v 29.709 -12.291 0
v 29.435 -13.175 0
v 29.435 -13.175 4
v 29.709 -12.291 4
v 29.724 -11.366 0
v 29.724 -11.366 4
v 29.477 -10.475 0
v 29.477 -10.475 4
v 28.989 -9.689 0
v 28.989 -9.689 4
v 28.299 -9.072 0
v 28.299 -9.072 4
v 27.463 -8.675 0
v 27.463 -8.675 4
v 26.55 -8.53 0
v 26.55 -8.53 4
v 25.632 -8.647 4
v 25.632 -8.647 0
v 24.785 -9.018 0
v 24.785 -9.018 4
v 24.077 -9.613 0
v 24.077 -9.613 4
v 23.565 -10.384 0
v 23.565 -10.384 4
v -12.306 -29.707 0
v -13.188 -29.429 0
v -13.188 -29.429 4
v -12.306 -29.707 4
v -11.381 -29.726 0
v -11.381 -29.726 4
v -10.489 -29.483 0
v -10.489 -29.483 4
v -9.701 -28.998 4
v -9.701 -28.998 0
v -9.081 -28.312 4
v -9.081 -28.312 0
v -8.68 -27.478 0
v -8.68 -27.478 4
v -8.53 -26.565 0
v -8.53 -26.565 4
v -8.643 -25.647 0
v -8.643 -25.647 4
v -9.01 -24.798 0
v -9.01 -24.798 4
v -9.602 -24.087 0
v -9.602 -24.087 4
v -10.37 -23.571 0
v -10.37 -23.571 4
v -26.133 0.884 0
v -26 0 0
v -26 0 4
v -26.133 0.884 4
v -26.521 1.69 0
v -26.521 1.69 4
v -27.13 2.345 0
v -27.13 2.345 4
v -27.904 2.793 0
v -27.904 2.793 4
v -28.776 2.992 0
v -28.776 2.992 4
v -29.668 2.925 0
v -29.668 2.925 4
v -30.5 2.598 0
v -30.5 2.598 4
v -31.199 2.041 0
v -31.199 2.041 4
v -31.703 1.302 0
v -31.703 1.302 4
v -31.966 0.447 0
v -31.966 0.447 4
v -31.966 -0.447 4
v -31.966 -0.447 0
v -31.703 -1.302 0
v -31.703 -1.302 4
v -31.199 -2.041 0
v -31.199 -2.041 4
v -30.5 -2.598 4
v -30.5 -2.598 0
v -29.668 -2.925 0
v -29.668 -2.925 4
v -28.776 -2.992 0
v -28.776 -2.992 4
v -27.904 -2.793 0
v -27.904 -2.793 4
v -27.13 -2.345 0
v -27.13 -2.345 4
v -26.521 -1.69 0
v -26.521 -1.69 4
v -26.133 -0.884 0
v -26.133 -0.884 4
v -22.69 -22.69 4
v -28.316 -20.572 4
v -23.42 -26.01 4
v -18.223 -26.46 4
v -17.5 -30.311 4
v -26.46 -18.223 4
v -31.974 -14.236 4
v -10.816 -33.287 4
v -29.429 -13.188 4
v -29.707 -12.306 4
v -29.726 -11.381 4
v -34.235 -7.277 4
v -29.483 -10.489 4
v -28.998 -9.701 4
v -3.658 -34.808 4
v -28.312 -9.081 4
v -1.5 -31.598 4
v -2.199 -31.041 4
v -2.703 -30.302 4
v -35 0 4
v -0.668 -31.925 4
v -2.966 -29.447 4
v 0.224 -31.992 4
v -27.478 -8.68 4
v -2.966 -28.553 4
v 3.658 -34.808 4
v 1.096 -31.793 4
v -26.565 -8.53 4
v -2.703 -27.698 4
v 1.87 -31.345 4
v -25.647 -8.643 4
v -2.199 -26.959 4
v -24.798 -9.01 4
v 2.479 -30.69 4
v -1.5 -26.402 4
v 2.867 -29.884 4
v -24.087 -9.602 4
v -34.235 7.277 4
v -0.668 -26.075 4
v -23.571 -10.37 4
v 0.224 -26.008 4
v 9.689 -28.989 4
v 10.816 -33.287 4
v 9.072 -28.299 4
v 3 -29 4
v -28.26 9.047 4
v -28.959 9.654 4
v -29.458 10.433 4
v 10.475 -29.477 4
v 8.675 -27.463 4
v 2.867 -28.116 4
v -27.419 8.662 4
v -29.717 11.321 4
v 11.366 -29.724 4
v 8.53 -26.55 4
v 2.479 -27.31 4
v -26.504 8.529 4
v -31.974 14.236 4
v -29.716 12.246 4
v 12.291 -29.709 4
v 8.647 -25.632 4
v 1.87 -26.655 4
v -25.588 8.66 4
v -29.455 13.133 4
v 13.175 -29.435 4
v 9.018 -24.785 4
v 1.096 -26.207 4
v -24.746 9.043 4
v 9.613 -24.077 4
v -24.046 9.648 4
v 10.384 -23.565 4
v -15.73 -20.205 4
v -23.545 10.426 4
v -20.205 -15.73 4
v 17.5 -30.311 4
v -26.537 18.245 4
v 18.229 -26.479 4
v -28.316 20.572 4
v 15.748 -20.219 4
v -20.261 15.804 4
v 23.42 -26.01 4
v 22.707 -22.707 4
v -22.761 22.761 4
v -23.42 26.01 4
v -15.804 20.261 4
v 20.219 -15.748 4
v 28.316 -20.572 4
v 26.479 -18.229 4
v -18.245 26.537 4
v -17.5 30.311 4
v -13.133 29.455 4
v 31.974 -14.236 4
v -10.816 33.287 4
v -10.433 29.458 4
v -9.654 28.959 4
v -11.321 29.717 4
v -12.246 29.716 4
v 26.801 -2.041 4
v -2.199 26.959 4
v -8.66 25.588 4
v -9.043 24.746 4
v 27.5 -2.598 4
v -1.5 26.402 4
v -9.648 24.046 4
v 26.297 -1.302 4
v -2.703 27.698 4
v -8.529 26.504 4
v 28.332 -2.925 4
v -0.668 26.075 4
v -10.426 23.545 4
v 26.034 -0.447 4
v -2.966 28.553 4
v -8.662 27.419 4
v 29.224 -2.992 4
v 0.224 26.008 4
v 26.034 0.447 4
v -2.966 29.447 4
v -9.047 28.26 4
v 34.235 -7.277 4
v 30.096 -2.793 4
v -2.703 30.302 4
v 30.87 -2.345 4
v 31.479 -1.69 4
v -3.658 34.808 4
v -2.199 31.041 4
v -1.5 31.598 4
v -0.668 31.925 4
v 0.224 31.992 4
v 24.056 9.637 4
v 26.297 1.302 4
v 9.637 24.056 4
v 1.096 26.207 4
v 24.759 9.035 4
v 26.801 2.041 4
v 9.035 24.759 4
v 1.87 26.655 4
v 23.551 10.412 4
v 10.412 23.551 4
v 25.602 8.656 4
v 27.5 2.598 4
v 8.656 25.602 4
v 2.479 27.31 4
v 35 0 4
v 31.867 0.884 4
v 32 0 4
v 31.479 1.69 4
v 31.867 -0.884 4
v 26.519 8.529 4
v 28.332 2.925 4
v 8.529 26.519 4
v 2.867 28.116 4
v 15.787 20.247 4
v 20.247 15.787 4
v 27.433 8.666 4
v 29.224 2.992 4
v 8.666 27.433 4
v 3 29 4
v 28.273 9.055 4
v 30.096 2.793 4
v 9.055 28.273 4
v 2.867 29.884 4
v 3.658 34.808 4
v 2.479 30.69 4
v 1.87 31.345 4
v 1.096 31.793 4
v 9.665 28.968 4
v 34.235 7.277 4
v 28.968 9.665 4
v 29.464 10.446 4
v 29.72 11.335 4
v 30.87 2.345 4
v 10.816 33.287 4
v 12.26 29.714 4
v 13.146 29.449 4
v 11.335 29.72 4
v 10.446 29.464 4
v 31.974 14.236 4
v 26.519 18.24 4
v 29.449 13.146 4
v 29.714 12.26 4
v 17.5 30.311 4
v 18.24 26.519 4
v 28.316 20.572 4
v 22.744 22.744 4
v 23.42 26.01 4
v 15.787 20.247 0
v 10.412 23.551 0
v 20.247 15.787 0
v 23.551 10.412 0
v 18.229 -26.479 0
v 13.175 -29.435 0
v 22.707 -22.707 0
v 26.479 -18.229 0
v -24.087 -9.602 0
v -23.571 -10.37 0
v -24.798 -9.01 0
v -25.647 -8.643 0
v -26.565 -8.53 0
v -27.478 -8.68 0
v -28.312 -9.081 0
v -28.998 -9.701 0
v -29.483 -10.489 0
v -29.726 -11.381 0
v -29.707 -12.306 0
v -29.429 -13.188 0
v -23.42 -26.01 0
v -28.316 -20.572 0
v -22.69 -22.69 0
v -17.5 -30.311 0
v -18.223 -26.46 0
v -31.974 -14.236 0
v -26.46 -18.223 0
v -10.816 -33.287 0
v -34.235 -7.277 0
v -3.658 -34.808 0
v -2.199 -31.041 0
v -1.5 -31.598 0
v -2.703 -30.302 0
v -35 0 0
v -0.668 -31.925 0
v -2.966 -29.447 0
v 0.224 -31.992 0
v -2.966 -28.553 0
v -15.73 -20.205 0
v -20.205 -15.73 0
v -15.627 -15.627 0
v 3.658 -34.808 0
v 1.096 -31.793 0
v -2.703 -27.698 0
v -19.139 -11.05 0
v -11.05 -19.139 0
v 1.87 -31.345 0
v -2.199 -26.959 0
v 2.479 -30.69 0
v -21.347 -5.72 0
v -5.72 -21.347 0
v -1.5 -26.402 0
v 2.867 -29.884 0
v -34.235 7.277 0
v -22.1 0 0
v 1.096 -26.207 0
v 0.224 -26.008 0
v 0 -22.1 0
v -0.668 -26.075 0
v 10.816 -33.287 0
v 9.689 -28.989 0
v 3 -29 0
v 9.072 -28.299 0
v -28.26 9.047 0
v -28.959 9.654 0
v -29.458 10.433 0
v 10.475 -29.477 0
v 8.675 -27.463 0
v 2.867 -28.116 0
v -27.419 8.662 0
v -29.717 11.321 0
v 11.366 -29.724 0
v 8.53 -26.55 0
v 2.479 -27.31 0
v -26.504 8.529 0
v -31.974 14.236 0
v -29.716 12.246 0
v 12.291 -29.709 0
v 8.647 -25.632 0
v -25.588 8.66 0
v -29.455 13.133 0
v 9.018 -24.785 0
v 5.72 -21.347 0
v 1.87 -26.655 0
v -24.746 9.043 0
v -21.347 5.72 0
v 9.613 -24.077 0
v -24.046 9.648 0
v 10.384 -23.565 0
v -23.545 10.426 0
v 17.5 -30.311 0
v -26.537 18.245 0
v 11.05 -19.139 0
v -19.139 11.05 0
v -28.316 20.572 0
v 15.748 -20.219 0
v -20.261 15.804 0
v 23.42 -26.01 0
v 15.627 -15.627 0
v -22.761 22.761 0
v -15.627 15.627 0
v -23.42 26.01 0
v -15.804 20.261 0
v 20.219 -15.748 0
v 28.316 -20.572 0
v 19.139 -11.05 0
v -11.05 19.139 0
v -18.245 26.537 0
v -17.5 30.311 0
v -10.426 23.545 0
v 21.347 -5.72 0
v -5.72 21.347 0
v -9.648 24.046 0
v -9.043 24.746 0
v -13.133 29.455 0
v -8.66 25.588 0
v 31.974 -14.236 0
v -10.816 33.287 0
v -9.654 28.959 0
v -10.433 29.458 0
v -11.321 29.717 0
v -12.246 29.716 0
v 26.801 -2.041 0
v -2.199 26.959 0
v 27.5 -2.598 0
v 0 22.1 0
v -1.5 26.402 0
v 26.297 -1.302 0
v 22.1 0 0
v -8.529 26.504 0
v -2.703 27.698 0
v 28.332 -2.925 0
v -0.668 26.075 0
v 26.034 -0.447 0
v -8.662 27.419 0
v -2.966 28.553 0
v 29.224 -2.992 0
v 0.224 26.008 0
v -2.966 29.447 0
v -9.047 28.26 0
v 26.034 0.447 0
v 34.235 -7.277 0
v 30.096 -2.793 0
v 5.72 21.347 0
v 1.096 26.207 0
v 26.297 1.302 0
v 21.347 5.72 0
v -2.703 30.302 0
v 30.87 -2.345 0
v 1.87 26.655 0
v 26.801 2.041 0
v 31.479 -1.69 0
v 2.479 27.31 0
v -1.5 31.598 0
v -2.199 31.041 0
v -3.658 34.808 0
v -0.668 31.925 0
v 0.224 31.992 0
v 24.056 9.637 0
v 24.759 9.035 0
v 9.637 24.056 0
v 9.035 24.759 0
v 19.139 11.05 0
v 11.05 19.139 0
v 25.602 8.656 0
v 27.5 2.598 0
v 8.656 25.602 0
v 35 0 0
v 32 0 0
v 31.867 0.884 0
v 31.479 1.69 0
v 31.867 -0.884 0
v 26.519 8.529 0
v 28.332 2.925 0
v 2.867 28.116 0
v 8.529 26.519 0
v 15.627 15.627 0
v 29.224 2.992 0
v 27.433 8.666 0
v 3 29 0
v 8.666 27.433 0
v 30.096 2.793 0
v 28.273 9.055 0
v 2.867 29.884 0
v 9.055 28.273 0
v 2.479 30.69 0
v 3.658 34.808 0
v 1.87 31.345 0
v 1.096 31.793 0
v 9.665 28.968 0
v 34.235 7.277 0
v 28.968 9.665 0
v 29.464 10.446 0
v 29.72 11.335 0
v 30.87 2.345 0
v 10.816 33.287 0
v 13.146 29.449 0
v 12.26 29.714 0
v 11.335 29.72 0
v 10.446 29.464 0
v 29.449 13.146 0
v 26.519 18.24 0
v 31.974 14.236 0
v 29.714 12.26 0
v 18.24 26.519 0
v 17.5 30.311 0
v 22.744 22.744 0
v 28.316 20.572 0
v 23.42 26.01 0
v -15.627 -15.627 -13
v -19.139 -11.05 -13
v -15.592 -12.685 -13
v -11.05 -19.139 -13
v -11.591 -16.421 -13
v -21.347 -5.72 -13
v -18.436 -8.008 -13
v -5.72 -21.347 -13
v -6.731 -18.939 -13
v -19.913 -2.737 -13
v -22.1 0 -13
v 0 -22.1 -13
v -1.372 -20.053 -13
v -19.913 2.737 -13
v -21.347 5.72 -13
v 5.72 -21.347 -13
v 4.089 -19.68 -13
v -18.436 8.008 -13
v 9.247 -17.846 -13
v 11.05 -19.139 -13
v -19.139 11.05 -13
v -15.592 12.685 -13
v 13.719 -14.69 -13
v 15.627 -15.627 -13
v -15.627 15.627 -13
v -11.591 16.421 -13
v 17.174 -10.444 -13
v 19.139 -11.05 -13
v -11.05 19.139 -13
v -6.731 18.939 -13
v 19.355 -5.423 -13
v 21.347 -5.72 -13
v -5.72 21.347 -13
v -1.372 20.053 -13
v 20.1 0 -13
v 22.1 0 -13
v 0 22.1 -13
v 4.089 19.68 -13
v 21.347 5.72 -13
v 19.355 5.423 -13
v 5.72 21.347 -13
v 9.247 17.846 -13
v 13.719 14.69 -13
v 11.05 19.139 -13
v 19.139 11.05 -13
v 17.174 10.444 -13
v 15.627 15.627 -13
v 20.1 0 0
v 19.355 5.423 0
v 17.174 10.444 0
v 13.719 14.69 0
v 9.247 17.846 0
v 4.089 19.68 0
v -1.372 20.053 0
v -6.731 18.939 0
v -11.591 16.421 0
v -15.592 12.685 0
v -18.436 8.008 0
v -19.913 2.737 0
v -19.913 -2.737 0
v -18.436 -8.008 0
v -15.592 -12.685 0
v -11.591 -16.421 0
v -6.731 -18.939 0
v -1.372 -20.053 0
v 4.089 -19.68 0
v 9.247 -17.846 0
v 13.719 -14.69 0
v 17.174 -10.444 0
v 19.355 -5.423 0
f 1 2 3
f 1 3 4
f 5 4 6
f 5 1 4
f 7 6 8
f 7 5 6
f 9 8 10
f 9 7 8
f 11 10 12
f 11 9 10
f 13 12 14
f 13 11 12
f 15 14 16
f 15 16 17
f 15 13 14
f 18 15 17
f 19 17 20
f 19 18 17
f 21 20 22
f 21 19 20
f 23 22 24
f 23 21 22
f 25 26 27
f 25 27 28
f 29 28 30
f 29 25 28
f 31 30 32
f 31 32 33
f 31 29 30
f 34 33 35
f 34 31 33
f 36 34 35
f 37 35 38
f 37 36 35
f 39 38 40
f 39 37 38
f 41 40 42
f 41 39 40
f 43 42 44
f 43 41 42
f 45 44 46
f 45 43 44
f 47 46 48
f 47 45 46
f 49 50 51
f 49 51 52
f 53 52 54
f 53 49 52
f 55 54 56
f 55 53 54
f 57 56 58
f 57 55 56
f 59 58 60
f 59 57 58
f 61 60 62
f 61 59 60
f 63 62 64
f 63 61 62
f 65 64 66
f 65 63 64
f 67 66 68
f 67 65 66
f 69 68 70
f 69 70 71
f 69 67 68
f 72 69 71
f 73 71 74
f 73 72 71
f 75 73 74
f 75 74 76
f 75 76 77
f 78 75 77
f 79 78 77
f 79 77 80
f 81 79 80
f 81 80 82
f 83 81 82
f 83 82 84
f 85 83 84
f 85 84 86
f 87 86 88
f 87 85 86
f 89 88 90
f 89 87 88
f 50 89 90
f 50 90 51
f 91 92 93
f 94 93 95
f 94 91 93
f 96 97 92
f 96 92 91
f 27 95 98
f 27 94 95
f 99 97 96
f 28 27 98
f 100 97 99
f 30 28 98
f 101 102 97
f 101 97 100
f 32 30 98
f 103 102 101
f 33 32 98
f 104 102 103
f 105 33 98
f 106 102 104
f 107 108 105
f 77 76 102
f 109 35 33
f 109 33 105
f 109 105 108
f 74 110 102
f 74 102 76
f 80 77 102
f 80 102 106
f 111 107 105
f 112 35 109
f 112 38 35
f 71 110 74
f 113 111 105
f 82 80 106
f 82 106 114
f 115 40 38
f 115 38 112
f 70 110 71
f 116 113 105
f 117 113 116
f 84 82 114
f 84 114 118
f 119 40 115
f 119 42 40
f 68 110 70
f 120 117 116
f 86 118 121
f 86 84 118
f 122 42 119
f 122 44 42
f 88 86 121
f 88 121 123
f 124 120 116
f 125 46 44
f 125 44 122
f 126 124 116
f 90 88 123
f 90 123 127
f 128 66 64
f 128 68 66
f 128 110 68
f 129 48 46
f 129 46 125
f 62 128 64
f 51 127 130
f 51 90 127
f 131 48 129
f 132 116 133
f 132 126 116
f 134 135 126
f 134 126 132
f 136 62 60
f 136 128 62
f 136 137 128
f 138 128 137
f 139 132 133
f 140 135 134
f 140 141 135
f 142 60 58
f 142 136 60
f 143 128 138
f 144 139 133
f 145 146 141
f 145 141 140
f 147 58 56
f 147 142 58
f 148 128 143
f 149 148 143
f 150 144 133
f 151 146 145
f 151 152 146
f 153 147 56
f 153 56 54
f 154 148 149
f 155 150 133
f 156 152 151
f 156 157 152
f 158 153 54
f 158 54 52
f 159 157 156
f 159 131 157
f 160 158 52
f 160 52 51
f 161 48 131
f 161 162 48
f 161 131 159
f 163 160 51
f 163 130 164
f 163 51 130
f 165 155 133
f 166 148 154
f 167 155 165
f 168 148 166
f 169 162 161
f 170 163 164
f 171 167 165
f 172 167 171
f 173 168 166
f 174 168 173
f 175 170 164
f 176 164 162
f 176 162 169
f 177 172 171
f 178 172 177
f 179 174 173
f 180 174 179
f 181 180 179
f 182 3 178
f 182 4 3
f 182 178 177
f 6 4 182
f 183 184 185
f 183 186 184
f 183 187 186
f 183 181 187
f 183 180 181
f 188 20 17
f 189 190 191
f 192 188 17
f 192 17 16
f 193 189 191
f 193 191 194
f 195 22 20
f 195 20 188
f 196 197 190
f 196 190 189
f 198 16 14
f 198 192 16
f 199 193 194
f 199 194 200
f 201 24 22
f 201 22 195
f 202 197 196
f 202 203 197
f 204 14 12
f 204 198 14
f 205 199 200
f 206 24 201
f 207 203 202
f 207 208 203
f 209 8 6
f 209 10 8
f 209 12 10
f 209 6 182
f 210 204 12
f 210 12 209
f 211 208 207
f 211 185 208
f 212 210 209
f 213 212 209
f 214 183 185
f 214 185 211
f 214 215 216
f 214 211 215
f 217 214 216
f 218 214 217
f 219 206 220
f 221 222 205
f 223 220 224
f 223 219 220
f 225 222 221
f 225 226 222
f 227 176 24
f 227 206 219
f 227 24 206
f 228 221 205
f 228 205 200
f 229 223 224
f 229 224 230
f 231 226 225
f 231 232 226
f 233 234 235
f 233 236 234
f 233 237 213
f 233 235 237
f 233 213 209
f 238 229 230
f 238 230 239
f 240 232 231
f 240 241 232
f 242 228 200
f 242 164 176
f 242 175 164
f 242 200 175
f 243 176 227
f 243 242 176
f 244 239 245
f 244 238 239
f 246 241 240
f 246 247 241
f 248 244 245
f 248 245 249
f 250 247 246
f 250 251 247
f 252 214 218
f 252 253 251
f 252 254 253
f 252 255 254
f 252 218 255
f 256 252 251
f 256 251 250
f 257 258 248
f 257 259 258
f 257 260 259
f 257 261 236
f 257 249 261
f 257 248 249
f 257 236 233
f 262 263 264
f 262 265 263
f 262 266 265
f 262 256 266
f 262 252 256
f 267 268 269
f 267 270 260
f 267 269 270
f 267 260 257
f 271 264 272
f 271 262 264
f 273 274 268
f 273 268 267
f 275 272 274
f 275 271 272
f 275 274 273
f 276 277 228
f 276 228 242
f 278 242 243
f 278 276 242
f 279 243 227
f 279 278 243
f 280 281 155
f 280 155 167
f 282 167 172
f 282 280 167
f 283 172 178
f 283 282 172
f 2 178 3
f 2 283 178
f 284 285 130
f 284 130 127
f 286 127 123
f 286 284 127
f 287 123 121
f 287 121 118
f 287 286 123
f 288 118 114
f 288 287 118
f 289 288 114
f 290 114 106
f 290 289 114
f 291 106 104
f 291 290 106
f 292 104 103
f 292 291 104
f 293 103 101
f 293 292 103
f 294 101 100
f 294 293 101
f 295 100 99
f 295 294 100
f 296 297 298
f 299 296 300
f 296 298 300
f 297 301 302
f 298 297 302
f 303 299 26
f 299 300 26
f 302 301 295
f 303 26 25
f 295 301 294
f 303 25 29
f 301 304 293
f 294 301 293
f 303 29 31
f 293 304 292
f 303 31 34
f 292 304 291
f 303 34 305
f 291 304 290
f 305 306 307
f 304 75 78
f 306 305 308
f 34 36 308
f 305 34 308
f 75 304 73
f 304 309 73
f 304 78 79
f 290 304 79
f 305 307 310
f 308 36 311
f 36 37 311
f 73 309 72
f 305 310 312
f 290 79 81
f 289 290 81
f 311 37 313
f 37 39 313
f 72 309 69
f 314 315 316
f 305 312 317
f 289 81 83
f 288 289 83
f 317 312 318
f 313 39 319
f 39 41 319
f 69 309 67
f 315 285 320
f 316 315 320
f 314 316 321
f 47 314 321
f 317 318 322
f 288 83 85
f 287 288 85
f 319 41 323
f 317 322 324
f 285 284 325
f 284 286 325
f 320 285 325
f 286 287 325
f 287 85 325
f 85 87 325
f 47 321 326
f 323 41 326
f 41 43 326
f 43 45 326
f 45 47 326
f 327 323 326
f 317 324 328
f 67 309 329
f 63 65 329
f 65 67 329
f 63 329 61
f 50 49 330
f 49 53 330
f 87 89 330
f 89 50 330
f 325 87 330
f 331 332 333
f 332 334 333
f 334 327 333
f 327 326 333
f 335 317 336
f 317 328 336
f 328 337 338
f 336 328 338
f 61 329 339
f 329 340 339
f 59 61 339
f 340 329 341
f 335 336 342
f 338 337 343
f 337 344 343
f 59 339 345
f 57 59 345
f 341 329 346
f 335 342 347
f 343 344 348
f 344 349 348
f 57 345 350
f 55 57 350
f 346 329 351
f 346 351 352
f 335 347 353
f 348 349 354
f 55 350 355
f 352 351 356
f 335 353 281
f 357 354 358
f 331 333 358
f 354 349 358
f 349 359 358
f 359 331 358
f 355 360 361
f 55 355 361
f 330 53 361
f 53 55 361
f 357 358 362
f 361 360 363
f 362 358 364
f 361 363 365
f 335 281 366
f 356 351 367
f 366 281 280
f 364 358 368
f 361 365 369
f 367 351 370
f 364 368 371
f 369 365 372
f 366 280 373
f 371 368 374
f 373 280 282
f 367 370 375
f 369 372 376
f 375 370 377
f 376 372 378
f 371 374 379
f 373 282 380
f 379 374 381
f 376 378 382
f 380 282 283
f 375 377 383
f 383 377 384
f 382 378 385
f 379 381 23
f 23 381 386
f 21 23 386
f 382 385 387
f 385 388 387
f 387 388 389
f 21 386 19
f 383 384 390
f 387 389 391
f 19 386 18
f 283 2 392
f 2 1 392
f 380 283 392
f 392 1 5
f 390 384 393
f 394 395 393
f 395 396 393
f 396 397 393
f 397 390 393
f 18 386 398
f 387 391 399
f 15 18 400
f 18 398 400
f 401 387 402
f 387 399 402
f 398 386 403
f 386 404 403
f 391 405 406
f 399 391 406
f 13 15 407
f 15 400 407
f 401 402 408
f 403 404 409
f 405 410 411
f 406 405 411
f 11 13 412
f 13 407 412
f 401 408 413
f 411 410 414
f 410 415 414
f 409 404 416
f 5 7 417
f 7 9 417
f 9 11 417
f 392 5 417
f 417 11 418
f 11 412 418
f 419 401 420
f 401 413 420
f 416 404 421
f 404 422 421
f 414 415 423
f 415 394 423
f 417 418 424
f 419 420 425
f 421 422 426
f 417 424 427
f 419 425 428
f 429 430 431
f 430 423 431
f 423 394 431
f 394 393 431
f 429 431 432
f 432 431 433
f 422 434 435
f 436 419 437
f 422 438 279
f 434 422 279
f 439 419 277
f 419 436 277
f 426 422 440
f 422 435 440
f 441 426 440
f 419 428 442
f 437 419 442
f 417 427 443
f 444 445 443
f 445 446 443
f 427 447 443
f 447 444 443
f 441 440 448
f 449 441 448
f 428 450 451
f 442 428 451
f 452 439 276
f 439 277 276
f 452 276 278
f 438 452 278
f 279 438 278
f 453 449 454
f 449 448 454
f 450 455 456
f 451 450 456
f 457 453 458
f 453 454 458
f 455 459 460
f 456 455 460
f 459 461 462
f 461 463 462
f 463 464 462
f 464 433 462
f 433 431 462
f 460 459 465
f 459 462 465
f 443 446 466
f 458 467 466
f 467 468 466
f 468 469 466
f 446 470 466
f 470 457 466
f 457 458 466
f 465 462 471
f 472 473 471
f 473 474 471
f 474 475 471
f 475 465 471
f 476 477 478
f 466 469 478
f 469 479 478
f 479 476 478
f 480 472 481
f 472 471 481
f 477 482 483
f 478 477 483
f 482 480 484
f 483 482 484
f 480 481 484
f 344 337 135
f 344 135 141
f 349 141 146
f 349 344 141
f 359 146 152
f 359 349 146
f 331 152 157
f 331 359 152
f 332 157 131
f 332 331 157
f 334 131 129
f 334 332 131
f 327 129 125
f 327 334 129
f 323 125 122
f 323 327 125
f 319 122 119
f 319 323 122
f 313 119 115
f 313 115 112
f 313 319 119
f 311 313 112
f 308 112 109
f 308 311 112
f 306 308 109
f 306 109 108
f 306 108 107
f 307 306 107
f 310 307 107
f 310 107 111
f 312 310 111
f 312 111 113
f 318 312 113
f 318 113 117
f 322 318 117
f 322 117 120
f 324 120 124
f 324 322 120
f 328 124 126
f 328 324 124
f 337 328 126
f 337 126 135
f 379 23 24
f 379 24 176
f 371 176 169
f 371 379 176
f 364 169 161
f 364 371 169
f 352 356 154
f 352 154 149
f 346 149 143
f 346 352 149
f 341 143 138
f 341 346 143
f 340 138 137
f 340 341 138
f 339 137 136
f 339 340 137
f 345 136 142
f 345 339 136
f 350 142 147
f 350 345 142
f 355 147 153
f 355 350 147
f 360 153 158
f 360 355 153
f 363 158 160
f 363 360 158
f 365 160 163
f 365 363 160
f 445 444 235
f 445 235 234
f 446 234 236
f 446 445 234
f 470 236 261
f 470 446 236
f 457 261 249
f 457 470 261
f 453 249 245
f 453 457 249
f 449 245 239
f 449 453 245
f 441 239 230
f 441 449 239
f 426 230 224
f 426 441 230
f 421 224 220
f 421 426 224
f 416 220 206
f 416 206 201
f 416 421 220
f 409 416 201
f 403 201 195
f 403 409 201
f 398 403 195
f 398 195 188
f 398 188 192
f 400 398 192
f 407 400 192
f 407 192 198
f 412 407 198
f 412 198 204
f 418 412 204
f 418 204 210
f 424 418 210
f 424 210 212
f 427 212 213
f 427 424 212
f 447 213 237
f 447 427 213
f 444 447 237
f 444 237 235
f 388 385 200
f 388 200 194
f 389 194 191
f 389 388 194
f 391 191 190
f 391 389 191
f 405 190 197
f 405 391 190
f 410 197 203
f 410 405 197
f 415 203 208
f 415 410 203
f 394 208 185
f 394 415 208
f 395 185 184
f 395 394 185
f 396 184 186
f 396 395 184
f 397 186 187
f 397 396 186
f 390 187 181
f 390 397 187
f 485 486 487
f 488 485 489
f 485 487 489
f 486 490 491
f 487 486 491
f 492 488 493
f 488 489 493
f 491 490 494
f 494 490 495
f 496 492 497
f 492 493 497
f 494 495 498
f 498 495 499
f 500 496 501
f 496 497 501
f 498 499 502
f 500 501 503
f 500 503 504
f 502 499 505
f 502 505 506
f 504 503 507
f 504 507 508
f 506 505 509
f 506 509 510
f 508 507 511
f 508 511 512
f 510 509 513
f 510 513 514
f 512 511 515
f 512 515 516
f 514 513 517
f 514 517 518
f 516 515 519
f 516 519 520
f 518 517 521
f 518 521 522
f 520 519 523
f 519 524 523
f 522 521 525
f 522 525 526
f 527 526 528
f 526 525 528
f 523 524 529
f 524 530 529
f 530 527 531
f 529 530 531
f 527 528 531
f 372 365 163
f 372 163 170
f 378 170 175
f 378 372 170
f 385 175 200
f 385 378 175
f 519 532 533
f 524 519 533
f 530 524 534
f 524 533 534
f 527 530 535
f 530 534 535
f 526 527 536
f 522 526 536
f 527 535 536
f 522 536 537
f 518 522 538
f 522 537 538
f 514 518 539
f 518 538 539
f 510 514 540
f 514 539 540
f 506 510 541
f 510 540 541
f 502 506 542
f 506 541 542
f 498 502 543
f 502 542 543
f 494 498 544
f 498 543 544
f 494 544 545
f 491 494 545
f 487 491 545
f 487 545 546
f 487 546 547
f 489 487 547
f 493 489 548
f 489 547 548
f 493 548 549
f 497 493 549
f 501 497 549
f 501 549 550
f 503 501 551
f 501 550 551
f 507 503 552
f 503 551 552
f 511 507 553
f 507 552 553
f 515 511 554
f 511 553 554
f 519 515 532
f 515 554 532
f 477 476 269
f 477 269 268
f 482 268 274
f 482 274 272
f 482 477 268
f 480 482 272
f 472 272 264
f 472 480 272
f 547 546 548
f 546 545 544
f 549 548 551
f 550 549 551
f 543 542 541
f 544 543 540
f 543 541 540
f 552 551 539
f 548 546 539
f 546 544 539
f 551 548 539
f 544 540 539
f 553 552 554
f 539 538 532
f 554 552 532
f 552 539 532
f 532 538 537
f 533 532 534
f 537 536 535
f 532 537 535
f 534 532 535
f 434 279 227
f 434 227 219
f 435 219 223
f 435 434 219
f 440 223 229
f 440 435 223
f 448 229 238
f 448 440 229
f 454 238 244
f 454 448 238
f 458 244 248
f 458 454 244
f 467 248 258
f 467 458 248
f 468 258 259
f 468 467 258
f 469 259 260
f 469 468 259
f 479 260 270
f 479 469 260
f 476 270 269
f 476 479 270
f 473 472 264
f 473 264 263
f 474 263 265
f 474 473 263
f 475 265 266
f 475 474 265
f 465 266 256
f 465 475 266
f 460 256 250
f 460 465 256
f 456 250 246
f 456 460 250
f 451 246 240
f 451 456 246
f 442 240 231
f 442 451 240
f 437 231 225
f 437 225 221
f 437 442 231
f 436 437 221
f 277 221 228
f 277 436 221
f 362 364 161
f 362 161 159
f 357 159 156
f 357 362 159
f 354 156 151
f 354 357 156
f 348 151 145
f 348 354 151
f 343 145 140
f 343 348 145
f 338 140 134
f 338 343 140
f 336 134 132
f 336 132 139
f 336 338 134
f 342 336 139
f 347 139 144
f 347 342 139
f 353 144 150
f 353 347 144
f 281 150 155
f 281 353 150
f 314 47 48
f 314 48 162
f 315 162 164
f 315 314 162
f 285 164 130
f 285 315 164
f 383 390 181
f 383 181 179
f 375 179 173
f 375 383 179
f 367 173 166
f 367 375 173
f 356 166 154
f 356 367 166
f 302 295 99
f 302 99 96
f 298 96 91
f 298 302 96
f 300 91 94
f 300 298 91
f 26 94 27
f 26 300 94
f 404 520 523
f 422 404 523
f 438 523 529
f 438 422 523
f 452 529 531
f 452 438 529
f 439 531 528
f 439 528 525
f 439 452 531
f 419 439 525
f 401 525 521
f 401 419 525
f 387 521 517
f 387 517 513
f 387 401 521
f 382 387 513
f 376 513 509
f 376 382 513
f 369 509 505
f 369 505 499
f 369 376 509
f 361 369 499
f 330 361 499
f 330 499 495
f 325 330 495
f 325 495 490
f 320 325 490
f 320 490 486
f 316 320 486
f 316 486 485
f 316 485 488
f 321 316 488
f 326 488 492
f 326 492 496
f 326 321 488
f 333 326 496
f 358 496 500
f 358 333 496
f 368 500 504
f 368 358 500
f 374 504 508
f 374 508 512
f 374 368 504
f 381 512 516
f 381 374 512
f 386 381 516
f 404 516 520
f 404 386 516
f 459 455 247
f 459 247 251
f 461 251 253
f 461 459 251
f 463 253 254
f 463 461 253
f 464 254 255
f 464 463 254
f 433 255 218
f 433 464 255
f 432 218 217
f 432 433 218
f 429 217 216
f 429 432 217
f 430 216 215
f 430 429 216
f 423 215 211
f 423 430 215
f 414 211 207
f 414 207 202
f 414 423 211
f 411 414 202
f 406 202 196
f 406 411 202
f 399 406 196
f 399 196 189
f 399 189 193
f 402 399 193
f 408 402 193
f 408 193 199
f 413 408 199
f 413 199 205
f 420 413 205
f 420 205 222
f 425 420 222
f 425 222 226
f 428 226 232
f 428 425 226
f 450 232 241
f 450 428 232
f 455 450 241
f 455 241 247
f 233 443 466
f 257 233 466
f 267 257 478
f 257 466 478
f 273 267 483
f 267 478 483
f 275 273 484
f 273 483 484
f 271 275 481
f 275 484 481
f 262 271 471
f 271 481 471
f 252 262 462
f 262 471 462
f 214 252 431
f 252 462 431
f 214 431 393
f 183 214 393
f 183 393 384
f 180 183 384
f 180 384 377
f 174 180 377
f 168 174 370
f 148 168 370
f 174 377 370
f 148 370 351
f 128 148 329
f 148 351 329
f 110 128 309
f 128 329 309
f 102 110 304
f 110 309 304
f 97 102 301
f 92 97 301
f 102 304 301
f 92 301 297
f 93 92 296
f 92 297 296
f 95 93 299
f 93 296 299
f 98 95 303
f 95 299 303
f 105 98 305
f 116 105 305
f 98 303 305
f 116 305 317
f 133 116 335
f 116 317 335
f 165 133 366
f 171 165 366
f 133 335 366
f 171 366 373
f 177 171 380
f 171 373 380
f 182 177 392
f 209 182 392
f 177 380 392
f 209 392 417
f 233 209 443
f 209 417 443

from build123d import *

# Parameters (mm, degrees)
SKETCH_1_R          = 22.1
SKETCH_1_R_2        = 20.1
EXTRUDE_1_DEPTH     = 13
SKETCH_3_R          = 35
EXTRUDE_2_DEPTH     = 4
CUT_EXTRUDE_2_DEPTH = 4
SKETCH_7_R          = 2.5
CUT_EXTRUDE_3_DEPTH = 4
SKETCH_8_R          = 3
CUT_EXTRUDE_4_DEPTH = 4


with BuildPart() as part:
    # 草图1 → 凸台-拉伸1 (new body)
    with BuildSketch(Plane.XY):
        Circle(SKETCH_1_R)
        Circle(SKETCH_1_R_2, mode=Mode.SUBTRACT)
    extrude(amount=-EXTRUDE_1_DEPTH)

    # 草图3 → 凸台-拉伸2 (add)
    with BuildSketch(Plane.XY):
        Circle(SKETCH_3_R)
    extrude(amount=EXTRUDE_2_DEPTH)

    # 草图6 → 切除-拉伸2 (cut)
    with BuildSketch(Plane.XY):
        with BuildLine():
            ThreePointArc((-13.13288474, 29.454672407), (-22.761081404, 22.761081404), (-29.454672407, 13.13288474))
            ThreePointArc((-29.454672407, 13.13288474), (-27.853665751, 8.824546582), (-23.545327593, 10.425553238))
            ThreePointArc((-23.545327593, 10.425553238), (-18.164887326, 18.164887326), (-10.425553238, 23.545327593))
            ThreePointArc((-10.425553238, 23.545327593), (-8.824546582, 27.853665751), (-13.13288474, 29.454672407))
        make_face()
        with BuildLine():
            ThreePointArc((29.448536872, 13.146197524), (22.743952769, 22.743952769), (13.146197524, 29.448536872))
            ThreePointArc((13.146197524, 29.448536872), (8.830682117, 27.866978535), (10.412240454, 23.551463128))
            ThreePointArc((10.412240454, 23.551463128), (18.147758691, 18.147758691), (23.551463128, 10.412240454))
            ThreePointArc((23.551463128, 10.412240454), (27.866978535, 8.830682117), (29.448536872, 13.146197524))
        make_face()
        with BuildLine():
            ThreePointArc((13.174546029, -29.435227837), (22.707404076, -22.707404076), (29.435227837, -13.174546029))
            ThreePointArc((29.435227837, -13.174546029), (27.895327039, -8.843991153), (23.564772163, -10.38389195))
            ThreePointArc((23.564772163, -10.38389195), (18.111209998, -18.111209998), (10.38389195, -23.564772163))
            ThreePointArc((10.38389195, -23.564772163), (8.843991153, -27.895327039), (13.174546029, -29.435227837))
        make_face()
        with BuildLine():
            ThreePointArc((-29.428635355, -13.188330396), (-22.68959412, -22.68959412), (-13.188330396, -29.428635355))
            ThreePointArc((-13.188330396, -29.428635355), (-8.850583634, -27.909111407), (-10.370107582, -23.571364645))
            ThreePointArc((-10.370107582, -23.571364645), (-18.093400043, -18.093400043), (-23.571364645, -10.370107582))
            ThreePointArc((-23.571364645, -10.370107582), (-27.909111407, -8.850583634), (-29.428635355, -13.188330396))
        make_face()
    extrude(amount=CUT_EXTRUDE_2_DEPTH, mode=Mode.SUBTRACT)

    # 草图7 → 切除-拉伸3 (cut)
    with BuildSketch(Plane(origin=(0, 0, 0), x_dir=(-1, 0, 0), z_dir=(0, 0, -1))):
        with Locations((0, 29)):
            Circle(SKETCH_7_R)
        with Locations((29, 0)):
            Circle(SKETCH_7_R)
        with Locations((0, -29)):
            Circle(SKETCH_7_R)
        with Locations((-29, 0)):
            Circle(SKETCH_7_R)
    extrude(amount=-CUT_EXTRUDE_3_DEPTH, mode=Mode.SUBTRACT)

    # 草图8 → 切除-拉伸4 (cut)
    with BuildSketch(Plane.XY):
        with Locations((0, 29)):
            Circle(SKETCH_8_R)
        with Locations((-29, 0)):
            Circle(SKETCH_8_R)
        with Locations((0, -29)):
            Circle(SKETCH_8_R)
        with Locations((29, 0)):
            Circle(SKETCH_8_R)
    extrude(amount=CUT_EXTRUDE_4_DEPTH, mode=Mode.SUBTRACT)


solid = part.part
